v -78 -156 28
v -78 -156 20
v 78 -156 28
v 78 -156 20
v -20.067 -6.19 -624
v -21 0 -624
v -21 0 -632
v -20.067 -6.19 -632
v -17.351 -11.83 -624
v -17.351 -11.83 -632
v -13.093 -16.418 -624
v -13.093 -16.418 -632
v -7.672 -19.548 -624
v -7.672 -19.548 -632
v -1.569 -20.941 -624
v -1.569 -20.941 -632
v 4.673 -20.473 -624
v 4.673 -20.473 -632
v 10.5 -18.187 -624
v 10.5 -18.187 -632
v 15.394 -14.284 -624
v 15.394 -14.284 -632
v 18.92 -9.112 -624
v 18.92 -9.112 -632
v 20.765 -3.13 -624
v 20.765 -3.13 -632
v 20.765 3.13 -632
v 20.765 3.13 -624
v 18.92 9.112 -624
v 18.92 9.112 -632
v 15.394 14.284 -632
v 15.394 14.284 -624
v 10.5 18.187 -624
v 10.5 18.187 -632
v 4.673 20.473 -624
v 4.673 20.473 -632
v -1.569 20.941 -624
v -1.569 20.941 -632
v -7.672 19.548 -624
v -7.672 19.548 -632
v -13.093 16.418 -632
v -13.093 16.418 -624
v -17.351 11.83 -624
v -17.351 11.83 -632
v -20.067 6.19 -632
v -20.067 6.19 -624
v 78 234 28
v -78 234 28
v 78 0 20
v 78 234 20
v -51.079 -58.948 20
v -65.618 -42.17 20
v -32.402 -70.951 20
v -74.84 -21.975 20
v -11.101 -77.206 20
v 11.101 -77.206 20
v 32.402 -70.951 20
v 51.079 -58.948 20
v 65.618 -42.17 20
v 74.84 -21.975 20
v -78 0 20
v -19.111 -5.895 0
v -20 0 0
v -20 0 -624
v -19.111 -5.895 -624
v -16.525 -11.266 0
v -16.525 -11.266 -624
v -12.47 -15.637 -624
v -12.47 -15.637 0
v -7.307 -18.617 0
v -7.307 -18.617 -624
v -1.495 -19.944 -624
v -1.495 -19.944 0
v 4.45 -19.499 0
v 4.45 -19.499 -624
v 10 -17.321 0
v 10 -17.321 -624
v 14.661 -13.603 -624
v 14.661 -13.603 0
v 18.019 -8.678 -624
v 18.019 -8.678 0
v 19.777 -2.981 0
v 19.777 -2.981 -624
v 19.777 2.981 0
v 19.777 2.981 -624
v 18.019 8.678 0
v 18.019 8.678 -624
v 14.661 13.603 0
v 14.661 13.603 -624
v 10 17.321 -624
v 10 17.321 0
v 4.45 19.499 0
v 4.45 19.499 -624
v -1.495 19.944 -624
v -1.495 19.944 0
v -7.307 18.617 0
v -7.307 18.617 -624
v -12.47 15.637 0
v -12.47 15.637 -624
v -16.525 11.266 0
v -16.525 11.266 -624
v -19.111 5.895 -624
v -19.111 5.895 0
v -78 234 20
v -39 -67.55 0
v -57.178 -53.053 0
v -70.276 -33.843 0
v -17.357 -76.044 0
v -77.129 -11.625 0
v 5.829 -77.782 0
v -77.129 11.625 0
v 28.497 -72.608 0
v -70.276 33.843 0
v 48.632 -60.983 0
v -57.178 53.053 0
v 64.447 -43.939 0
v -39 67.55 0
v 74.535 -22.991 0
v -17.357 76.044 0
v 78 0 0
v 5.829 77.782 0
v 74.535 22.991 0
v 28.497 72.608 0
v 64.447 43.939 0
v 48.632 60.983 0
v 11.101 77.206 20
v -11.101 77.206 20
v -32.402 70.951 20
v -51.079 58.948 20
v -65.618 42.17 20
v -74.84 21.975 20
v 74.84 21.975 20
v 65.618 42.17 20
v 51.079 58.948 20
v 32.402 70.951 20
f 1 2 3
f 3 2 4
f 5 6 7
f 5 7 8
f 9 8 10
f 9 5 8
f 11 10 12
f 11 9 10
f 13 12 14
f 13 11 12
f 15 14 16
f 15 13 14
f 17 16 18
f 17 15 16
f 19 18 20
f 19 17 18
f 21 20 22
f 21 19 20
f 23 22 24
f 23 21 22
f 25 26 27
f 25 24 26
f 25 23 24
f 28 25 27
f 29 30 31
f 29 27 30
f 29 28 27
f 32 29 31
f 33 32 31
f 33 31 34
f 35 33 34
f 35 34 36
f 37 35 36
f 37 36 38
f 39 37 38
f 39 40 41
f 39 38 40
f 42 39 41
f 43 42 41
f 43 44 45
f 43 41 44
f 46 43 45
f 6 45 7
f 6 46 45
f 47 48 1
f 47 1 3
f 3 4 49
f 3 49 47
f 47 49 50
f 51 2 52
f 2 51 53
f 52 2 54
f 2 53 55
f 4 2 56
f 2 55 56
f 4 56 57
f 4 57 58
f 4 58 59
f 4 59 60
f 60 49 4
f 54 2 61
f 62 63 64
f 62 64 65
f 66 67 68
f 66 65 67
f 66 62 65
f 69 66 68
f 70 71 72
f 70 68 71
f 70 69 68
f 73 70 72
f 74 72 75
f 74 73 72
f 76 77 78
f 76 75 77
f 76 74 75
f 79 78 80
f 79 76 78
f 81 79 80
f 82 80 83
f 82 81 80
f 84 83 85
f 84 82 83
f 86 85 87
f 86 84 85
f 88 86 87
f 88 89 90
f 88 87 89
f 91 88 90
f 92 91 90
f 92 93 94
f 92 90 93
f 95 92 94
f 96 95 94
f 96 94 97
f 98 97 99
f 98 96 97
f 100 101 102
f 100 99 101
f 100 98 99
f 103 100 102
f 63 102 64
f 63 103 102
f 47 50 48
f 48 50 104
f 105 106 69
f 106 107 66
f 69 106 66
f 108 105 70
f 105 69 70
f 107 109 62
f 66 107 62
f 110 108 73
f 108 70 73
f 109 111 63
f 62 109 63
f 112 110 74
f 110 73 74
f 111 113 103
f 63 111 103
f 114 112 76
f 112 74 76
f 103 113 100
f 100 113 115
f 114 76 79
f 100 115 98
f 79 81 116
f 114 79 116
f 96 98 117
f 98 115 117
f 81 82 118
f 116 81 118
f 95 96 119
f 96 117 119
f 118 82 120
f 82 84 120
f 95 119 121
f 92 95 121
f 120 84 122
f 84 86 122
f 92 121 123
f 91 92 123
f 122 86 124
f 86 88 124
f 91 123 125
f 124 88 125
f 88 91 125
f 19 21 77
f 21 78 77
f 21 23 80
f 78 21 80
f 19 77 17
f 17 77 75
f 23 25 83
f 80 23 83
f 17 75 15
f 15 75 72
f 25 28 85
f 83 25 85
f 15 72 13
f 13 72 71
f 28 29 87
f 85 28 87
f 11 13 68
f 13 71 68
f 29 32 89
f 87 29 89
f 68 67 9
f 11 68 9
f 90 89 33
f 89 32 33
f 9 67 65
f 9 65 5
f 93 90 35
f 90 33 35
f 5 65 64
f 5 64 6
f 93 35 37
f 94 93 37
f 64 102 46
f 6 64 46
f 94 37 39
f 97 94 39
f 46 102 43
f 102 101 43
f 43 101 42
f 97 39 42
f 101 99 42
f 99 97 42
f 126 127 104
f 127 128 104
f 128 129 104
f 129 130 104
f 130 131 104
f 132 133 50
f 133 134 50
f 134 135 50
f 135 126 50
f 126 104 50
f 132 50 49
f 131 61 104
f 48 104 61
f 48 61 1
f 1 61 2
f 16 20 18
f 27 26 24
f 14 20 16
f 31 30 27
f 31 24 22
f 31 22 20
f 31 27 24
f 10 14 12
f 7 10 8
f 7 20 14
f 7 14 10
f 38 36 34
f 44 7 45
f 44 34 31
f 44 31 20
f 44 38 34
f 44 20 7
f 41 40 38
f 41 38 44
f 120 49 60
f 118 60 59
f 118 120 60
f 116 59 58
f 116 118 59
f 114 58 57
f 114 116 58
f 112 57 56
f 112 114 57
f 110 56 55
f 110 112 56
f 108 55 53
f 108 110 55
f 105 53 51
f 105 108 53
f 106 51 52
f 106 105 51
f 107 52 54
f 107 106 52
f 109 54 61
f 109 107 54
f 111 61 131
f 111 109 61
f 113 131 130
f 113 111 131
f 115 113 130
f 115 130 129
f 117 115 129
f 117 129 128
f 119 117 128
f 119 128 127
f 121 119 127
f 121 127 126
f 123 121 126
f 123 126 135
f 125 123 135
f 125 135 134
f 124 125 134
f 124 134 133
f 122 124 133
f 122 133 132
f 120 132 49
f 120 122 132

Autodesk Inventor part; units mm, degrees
ref_plane "YZ Plane" through (0, 0, 0) normal (1, 0, 0) x (0, 1, 0)
ref_plane "XZ Plane" through (0, 0, 0) normal (0, 1, 0) x (-1, 0, 0)
ref_plane "XY Plane" through (0, 0, 0) normal (0, 0, 1) x (1, 0, 0)
sketch "Sketch1" plane through (0, 0, 0) normal (0, 0, 1) x (1, 0, 0)
  circle A0 centre (0, 0) radius 78
extrude "Connector" add sketch "Sketch1" along normal blind 20
sketch "Sketch2" plane through (0, 0, 0) normal (0, 0, -1) x (-1, 0, 0)
  circle A0 centre (0, 0) radius 20
extrude "RotAxis" add sketch "Sketch2" along normal blind 624
sketch "Sketch3" plane through (0, 0, 20) normal (0, 0, 1) x (1, 0, 0)
  line L0 (78, 234) -> (-78, 234)
  line L1 (-78, 234) -> (-78, -156)
  line L2 (-78, -156) -> (78, -156)
  line L3 (78, -156) -> (78, 234)
  point P0 (0, 0)
extrude "TelescopeMount" add sketch "Sketch3" along normal blind 8
sketch "Sketch4" plane through (0, 0, -624) normal (0, 0, -1) x (-1, 0, 0)
  circle A0 centre (0, 0) radius 21
extrude "Cap" add sketch "Sketch4" along normal blind 8
properties part number "DecAxis"
